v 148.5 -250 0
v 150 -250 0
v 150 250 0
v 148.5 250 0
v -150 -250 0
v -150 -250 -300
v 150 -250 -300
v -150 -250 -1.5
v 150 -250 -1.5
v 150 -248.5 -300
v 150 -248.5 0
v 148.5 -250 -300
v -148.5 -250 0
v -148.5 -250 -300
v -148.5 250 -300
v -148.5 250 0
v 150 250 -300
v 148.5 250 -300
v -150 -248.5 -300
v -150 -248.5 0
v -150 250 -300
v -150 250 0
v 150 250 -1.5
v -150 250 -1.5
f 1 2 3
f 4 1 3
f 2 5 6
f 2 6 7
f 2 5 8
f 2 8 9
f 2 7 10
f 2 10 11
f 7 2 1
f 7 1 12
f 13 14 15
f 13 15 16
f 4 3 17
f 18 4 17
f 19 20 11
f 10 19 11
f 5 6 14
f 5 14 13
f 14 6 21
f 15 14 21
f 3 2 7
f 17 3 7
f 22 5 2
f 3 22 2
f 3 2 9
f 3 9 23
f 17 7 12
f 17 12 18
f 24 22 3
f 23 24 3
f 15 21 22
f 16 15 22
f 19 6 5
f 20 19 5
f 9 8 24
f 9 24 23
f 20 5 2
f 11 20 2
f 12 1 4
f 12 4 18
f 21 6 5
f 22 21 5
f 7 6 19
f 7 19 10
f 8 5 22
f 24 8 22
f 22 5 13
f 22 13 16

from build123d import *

# Parameters (mm, degrees)
SKETCH1_W           = 300
SKETCH1_H           = 500
BOSS_EXTRUDE1_DEPTH = 1.5
SKETCH2_W           = 300
SKETCH2_H           = 500
BOSS_EXTRUDE2_DEPTH = 1.5
SKETCH3_W           = 300
SKETCH3_H           = 500
BOSS_EXTRUDE3_DEPTH = 1.5
SKETCH4_W           = 300
SKETCH4_H           = 300
BOSS_EXTRUDE5_DEPTH = 1.5


with BuildPart() as part:
    # Sketch1 → Boss-Extrude1 (new body)
    with BuildSketch(Plane.XY):
        Rectangle(SKETCH1_W, SKETCH1_H)
    extrude(amount=-BOSS_EXTRUDE1_DEPTH)


with BuildPart() as body_2:
    # Sketch2 → Boss-Extrude2 (new body)
    with BuildSketch(Plane(origin=(150, 0, 0), x_dir=(0, 0, -1), z_dir=(1, 0, 0))):
        with Locations((150, 0)):
            Rectangle(SKETCH2_W, SKETCH2_H)
    extrude(amount=-BOSS_EXTRUDE2_DEPTH)


with BuildPart() as body_3:
    # Sketch3 → Boss-Extrude3 (new body)
    with BuildSketch(Plane.ZY.offset(150)):
        with Locations((-150, 0)):
            Rectangle(SKETCH3_W, SKETCH3_H)
    extrude(amount=-BOSS_EXTRUDE3_DEPTH)


with BuildPart() as body_4:
    # Sketch4 → Boss-Extrude5 (new body)
    with BuildSketch(Plane.XZ.offset(250)):
        with Locations((0, -150)):
            Rectangle(SKETCH4_W, SKETCH4_H)
    extrude(amount=-BOSS_EXTRUDE5_DEPTH)


solid = Compound([part.part, body_2.part, body_3.part, body_4.part])
